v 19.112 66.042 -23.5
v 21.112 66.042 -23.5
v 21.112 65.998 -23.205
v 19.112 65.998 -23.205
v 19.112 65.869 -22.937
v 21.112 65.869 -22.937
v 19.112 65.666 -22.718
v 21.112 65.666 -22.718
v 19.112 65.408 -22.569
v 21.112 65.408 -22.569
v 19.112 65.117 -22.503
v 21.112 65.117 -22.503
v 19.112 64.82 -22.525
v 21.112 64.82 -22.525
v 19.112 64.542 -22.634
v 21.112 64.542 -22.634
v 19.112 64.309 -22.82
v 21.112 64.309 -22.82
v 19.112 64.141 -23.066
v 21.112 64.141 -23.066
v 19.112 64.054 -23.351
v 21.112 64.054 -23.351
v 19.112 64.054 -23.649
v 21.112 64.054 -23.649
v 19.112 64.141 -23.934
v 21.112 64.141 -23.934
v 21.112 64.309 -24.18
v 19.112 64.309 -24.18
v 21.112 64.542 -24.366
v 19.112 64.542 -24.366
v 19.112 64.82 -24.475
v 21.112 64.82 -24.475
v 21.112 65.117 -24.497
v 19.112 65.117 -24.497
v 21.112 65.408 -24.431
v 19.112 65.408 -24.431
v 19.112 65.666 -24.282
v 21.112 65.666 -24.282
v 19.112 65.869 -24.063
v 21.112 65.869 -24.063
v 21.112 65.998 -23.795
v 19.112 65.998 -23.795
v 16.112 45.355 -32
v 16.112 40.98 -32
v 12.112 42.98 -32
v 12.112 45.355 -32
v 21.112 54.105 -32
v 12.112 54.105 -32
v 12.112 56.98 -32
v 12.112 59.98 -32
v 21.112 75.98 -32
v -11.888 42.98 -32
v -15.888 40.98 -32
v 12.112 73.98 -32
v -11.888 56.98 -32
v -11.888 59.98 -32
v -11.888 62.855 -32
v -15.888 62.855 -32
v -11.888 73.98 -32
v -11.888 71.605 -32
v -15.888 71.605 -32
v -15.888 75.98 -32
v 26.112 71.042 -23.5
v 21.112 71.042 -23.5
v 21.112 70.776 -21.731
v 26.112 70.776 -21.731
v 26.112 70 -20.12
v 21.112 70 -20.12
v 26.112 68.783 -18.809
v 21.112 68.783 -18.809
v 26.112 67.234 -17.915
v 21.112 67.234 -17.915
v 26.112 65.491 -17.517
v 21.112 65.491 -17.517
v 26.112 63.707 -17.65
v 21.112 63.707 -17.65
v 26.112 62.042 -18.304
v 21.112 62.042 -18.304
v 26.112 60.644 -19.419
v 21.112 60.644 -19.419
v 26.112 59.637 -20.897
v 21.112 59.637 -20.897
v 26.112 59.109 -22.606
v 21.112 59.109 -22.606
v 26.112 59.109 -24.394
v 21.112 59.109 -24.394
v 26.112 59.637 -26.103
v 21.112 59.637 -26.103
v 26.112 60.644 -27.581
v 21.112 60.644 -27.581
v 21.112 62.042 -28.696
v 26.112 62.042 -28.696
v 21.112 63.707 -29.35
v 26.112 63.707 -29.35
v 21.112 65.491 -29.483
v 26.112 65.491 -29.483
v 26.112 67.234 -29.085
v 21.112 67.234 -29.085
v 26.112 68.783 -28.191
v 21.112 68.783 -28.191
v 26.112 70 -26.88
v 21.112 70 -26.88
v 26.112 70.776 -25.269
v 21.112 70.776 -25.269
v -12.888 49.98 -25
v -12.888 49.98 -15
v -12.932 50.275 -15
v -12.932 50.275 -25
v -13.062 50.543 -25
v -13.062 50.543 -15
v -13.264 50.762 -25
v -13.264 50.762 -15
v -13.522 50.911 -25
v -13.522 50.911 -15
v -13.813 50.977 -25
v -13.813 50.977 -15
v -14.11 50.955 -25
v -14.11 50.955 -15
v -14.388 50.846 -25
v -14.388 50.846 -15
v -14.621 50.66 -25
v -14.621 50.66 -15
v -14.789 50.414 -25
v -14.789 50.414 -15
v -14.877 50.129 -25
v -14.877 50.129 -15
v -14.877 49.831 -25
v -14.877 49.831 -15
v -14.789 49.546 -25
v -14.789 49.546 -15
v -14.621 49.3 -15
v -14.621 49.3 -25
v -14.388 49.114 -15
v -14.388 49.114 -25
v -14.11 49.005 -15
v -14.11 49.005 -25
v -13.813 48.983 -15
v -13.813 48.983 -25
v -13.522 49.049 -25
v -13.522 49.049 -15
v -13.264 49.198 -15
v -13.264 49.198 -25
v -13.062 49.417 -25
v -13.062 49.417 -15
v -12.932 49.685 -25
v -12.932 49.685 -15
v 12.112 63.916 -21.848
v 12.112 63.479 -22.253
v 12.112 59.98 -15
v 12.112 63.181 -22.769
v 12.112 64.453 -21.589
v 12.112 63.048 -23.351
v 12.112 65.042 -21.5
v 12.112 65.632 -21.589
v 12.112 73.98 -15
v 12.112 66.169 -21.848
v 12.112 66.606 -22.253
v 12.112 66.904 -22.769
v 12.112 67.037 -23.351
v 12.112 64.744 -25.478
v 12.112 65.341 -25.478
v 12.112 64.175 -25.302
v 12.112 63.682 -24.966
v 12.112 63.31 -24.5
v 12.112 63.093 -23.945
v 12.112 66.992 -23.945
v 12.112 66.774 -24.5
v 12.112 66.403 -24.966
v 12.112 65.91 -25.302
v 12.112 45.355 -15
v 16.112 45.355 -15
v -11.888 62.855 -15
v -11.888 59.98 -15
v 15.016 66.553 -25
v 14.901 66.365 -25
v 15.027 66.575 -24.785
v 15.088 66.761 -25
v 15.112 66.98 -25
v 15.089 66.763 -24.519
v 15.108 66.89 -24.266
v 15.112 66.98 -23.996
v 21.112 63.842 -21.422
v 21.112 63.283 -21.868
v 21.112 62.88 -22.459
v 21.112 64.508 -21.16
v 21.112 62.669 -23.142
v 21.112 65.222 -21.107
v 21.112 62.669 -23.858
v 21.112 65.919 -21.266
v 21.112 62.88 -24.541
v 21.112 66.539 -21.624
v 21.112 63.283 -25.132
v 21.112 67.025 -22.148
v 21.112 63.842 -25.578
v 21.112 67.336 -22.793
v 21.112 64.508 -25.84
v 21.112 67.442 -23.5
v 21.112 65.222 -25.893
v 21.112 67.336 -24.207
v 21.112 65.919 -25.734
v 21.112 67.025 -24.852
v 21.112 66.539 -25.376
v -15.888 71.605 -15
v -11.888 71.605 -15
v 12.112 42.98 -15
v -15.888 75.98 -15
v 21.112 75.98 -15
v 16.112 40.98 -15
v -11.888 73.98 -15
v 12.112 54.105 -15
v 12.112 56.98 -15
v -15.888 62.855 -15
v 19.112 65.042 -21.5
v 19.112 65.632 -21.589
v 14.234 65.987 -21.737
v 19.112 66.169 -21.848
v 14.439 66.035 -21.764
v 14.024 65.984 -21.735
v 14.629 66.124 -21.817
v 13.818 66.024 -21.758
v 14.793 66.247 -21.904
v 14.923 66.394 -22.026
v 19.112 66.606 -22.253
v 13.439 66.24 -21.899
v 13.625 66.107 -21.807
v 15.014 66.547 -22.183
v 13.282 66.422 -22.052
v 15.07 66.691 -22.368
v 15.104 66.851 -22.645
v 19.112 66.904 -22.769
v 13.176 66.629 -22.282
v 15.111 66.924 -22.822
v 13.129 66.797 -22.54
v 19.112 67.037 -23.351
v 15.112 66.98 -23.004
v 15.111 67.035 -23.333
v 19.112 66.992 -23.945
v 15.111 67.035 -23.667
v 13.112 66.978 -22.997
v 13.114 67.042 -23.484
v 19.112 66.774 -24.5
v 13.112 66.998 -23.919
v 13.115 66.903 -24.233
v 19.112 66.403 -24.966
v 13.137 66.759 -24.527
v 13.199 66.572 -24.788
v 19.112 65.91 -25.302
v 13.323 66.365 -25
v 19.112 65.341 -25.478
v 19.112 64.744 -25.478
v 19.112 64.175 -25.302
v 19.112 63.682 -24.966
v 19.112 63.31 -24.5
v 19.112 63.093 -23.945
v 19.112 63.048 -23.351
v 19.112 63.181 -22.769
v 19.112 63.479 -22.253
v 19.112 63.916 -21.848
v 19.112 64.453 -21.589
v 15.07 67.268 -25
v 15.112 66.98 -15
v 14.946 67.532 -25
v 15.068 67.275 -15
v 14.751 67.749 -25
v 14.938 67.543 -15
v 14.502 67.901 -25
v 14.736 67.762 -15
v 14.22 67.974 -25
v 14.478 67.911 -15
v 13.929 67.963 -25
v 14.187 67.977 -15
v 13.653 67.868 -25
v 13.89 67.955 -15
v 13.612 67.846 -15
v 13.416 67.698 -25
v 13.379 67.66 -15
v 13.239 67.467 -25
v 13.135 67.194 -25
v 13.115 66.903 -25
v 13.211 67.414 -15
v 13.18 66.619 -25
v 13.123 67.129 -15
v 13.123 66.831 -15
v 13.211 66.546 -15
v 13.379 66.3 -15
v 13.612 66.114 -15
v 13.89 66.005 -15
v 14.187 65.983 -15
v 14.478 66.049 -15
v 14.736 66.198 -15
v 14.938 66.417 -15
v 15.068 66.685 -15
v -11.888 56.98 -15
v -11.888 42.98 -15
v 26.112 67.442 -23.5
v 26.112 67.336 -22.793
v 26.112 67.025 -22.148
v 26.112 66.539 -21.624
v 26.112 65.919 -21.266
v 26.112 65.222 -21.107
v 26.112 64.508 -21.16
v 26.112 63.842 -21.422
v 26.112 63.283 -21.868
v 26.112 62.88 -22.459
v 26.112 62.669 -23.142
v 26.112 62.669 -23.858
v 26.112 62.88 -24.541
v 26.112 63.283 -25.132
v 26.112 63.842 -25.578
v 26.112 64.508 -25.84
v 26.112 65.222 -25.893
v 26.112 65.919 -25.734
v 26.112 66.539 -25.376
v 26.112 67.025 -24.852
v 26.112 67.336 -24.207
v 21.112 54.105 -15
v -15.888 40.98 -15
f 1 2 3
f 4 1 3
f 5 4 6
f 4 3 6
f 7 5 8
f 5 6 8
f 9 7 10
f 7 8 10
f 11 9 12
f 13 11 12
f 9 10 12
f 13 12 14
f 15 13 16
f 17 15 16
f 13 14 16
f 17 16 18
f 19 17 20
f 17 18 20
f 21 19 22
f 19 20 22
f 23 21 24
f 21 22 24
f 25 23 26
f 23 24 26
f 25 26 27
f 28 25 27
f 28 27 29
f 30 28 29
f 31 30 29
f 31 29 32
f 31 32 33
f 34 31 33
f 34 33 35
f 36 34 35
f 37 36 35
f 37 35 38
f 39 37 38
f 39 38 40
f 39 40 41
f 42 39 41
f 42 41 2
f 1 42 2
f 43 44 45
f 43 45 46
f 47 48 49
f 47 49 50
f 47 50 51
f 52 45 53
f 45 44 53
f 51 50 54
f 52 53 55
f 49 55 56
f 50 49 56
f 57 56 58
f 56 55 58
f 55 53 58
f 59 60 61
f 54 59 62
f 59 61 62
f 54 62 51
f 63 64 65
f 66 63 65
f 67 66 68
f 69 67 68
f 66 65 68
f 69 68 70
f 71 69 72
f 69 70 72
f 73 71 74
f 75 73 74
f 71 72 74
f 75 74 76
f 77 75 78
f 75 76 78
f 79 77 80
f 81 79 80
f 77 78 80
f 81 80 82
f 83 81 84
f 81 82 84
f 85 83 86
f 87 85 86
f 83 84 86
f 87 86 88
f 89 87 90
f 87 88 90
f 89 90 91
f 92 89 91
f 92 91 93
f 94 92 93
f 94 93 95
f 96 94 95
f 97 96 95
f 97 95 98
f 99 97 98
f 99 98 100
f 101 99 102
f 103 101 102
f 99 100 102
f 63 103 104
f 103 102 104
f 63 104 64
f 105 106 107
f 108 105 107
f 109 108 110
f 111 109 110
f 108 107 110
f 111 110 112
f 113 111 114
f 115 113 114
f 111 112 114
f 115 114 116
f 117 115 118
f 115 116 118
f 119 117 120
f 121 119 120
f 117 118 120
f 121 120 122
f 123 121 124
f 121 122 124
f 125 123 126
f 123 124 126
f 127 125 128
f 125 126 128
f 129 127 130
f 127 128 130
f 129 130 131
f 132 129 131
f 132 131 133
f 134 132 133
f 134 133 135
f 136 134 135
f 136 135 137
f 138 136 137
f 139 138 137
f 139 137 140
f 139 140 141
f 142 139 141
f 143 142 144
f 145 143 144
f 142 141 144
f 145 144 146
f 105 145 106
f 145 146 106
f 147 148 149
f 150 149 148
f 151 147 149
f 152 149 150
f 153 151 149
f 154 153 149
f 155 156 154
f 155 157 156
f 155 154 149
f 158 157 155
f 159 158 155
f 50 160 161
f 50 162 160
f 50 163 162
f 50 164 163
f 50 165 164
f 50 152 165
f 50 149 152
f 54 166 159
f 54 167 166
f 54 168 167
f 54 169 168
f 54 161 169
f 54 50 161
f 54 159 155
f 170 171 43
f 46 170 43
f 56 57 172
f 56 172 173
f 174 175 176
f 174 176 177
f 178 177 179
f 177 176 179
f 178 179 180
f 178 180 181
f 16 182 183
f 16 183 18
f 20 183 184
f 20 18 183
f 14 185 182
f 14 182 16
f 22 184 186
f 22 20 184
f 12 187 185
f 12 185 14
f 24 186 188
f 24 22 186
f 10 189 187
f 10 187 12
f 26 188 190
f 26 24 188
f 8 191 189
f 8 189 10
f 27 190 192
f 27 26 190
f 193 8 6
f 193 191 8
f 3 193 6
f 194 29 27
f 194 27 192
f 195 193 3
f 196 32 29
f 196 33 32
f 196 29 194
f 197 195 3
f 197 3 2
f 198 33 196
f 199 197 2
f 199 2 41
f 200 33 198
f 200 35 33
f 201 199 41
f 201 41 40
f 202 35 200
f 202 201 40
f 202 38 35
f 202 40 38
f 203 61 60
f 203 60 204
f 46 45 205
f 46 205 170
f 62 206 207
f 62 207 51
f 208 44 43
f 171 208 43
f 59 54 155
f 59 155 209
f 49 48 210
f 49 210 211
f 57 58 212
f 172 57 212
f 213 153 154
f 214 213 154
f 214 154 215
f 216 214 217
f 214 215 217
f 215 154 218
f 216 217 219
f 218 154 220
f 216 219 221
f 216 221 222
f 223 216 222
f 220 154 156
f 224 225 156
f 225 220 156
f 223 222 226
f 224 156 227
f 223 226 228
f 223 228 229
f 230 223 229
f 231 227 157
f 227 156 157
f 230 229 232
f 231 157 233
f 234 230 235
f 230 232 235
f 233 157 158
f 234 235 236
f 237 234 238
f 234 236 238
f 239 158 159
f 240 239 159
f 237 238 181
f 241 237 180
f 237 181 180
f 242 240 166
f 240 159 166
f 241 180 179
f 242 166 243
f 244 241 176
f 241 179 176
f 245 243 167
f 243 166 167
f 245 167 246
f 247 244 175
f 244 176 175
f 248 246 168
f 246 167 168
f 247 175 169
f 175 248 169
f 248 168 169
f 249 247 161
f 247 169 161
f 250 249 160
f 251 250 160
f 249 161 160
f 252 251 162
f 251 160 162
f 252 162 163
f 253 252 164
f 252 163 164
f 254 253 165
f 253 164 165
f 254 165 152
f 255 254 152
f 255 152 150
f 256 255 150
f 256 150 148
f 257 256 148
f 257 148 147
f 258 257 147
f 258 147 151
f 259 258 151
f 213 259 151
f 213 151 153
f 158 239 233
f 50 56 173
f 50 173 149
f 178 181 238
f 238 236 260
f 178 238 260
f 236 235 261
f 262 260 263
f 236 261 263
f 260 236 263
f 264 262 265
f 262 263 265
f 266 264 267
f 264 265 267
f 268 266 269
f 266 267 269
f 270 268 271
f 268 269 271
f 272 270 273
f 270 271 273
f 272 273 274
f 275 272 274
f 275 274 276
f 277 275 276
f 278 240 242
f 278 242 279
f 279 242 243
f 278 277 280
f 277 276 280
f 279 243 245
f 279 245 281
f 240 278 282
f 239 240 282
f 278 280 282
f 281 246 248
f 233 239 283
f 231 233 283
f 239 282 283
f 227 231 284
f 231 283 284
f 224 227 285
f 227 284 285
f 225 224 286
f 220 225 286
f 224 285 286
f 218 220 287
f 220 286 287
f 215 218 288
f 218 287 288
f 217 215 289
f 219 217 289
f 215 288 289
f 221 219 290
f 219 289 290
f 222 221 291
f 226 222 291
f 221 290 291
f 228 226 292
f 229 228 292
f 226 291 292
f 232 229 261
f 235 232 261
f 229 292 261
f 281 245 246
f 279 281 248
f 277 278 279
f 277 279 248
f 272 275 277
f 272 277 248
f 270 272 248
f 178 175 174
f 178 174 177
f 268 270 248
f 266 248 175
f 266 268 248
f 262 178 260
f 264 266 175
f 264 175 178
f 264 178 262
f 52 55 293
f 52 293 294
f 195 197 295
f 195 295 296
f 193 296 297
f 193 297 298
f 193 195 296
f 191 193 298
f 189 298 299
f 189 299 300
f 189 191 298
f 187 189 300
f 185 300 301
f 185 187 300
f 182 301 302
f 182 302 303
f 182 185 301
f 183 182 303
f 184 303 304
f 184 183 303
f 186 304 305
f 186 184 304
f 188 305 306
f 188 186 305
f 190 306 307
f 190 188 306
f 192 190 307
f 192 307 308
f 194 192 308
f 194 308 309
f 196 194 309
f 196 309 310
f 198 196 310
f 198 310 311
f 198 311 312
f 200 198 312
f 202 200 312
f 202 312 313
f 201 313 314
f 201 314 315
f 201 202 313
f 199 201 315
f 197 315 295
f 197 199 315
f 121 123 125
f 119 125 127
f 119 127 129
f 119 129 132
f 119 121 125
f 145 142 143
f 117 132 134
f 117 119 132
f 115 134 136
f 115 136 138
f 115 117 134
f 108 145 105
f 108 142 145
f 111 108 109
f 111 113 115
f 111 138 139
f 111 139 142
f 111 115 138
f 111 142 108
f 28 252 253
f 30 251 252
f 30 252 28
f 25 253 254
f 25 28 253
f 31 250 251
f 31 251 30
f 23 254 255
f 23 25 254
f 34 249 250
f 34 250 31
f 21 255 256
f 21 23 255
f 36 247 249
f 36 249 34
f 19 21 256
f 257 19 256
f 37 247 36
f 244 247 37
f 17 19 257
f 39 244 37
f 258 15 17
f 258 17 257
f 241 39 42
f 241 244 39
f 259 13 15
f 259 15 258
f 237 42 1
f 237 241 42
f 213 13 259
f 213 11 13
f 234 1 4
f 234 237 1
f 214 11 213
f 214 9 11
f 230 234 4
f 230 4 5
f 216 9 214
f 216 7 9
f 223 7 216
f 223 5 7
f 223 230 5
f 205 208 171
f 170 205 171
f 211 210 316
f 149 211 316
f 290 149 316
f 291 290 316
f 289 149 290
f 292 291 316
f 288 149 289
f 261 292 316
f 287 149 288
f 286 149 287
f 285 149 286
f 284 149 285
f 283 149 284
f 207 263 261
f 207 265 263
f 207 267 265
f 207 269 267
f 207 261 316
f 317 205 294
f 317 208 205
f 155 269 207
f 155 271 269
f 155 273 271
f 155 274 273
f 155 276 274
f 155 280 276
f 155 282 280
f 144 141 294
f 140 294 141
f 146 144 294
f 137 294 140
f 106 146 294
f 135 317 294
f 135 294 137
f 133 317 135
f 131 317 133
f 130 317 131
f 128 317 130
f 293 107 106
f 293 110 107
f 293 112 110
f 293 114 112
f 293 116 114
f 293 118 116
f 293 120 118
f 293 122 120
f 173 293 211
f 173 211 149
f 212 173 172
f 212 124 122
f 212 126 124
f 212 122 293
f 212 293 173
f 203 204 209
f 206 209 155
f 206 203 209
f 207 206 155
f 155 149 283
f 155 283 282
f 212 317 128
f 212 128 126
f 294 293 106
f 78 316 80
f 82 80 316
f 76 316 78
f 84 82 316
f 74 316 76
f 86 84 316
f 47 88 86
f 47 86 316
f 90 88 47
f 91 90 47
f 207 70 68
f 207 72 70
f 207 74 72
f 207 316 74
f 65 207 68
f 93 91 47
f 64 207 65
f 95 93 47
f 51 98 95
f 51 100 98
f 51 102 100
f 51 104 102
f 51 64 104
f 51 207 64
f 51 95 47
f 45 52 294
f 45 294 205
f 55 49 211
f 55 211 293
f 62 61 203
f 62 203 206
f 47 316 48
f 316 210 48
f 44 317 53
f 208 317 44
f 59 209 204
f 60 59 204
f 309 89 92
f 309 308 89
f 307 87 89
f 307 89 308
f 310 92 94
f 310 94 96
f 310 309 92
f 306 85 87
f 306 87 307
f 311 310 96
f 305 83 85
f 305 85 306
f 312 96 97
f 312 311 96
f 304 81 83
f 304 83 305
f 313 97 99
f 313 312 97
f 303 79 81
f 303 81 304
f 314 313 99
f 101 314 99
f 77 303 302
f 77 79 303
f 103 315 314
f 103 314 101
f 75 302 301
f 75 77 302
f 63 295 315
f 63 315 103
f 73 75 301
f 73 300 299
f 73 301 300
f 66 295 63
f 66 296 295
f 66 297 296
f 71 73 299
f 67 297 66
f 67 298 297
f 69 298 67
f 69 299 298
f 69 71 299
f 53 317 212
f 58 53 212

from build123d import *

# Parameters (mm, degrees)
SKETCH2_W               = 32.000000477
SKETCH2_H               = 35
SKETCH2_W_2             = 22
SKETCH2_H_2             = 5
BOSS_EXTRUDE1_DEPTH     = 35
SKETCH3_W               = 15
SKETCH3_H               = 35
CUT_EXTRUDE1_DEPTH      = 90.56534365
CUT_EXTRUDE2_REACH      = 91.565
SKETCH4_W               = 20
SKETCH4_H               = 8.75
CUT_EXTRUDE3_REACH      = 91.565
SKETCH5_W               = 20
SKETCH5_H               = 8.75
SKETCH6_W               = 3
SKETCH6_H               = 35
CUT_EXTRUDE4_DEPTH      = 90.56534365
SKETCH11_R              = 1
CUT_EXTRUDE5_DEPTH      = 10
CUT_EXTRUDE6_DEPTH      = 80.508206961
CUT_EXTRUDE6_DEPTH_BACK = 17
CUT_EXTRUDE9_START      = -17
CUT_EXTRUDE9_DEPTH      = 17
SKETCH7_W               = 17
SKETCH7_H               = 21.875
BOSS_EXTRUDE2_DEPTH     = 5
SKETCH14_R              = 6
SKETCH14_R_2            = 2.4
BOSS_EXTRUDE6_DEPTH     = 5
CUT_EXTRUDE10_REACH     = 92.366
SKETCH15_R              = 1
SKETCH16_R              = 2
CUT_EXTRUDE11_DEPTH     = 7.000000238


# Read off the part's stored shape, not the designer's step: Cut-Extrude9
with BuildPart() as part:
    # Sketch2 → Boss-Extrude1 (new body)
    # profile 1 of 2: a face of its own
    with BuildSketch(Plane.XY):
        with Locations((0.112238017, 58.479936513)):
            Rectangle(SKETCH2_W, SKETCH2_H)
        Polygon((-10.887761984, 72.979936603), (-10.887761984, 43.979936513), (11.112238016, 43.979936513), (11.112238016, 72.979936513), align=None, mode=Mode.SUBTRACT)
    # profile 2 of 2: a face of its own
    with BuildSketch(Plane.XY):
        with Locations((0.112238016, 58.479936513)):
            Rectangle(SKETCH2_W_2, SKETCH2_H_2)
    extrude(amount=-BOSS_EXTRUDE1_DEPTH)

    # Sketch3 → Cut-Extrude1 (cut, through all)
    with BuildSketch(Plane(origin=(16.112238255, 0, 0), x_dir=(0, 0, -1), z_dir=(1, 0, 0))):
        with Locations((7.5, 58.479936513)):
            Rectangle(SKETCH3_W, SKETCH3_H)
    extrude(amount=-CUT_EXTRUDE1_DEPTH, mode=Mode.SUBTRACT)

    # Sketch4 → Cut-Extrude2 (cut, up to next)
    with BuildSketch(Plane.ZY.offset(15.887762222), mode=Mode.PRIVATE) as cut_extrude2_sk1:
        with Locations((-25, 67.229936513)):
            Rectangle(SKETCH4_W, SKETCH4_H)
    cut_extrude2_tool1 = extrude(cut_extrude2_sk1.sketch, amount=-CUT_EXTRUDE2_REACH, mode=Mode.PRIVATE) & part.part
    add(cut_extrude2_tool1.solids().sort_by_distance((-15.887762, 67.229937, -25))[0], mode=Mode.SUBTRACT)

    # Sketch5 → Cut-Extrude3 (cut, up to next)
    with BuildSketch(Plane(origin=(16.112238255, 0, 0), x_dir=(0, 0, -1), z_dir=(1, 0, 0)), mode=Mode.PRIVATE) as cut_extrude3_sk1:
        with Locations((25, 49.729936513)):
            Rectangle(SKETCH5_W, SKETCH5_H)
    cut_extrude3_tool1 = extrude(cut_extrude3_sk1.sketch, amount=-CUT_EXTRUDE3_REACH, mode=Mode.PRIVATE) & part.part
    add(cut_extrude3_tool1.solids().sort_by_distance((16.112238, 49.729937, -25))[0], mode=Mode.SUBTRACT)

    # Sketch6 → Cut-Extrude4 (cut, through all)
    with BuildSketch(Plane.ZY.offset(15.887762222)):
        with Locations((-33.5, 58.479936513)):
            Rectangle(SKETCH6_W, SKETCH6_H)
    extrude(amount=-CUT_EXTRUDE4_DEPTH, mode=Mode.SUBTRACT)

    # Sketch11 → Cut-Extrude5 (cut)
    with BuildSketch(Plane.XY.offset(-15)):
        with Locations((14.112238016, 66.979936513)):
            Circle(SKETCH11_R)
        with Locations((-13.887761984, 49.979936513)):
            Circle(SKETCH11_R)
    extrude(amount=-CUT_EXTRUDE5_DEPTH, mode=Mode.SUBTRACT)

    # Sketch12 → Cut-Extrude6 (cut, two sides: drawn at the far end of the back side and taken through both)
    with BuildSketch(Plane.XY.offset(-15).offset(-CUT_EXTRUDE6_DEPTH_BACK)):
        Polygon((-10.887761984, 62.854936513), (-11.887761984, 62.854936513), (-11.887761984, 59.979936513), (12.112238016, 59.979936513), (12.112238016, 73.979936509), (-11.887761984, 73.979936607), (-11.887761984, 71.604936513), (-10.887761984, 71.604936513), (-10.887761984, 72.979936603), (11.112238016, 72.979936513), (11.112238016, 60.979936513), (-10.887761984, 60.979936513), align=None)
    extrude(amount=CUT_EXTRUDE6_DEPTH + CUT_EXTRUDE6_DEPTH_BACK, mode=Mode.SUBTRACT)

    # Cut-Extrude9 outline → Cut-Extrude9 (cut)
    with BuildSketch(Plane.XY.offset(-15).offset(CUT_EXTRUDE9_START)):
        Polygon((12.112238016, 56.979936513), (-11.887761984, 56.979936513), (-11.887761984, 42.979936513), (12.112238016, 42.979936513), (12.112238016, 45.354936513), (11.112238016, 45.354936513), (11.112238016, 43.979936513), (-10.887761984, 43.979936513), (-10.887761984, 55.979936513), (11.112238016, 55.979936513), (11.112238016, 54.104936513), (12.112238016, 54.104936513), align=None)
    extrude(amount=CUT_EXTRUDE9_DEPTH, mode=Mode.SUBTRACT)

    # Sketch7 → Boss-Extrude2 (add)
    with BuildSketch(Plane(origin=(16.112238255, 0, 0), x_dir=(0, 0, -1), z_dir=(1, 0, 0))):
        with Locations((23.5, 65.042436513)):
            Rectangle(SKETCH7_W, SKETCH7_H)
    extrude(amount=BOSS_EXTRUDE2_DEPTH)

    # Sketch14 → Boss-Extrude6 (add)
    with BuildSketch(Plane(origin=(21.112238255, 0, 0), x_dir=(0, 0, -1), z_dir=(1, 0, 0))):
        with Locations(Location((23.5, 65.042436513, 0), (0, 0, 90))):
            Circle(SKETCH14_R)
        with Locations(Location((23.5, 65.042436513, 0), (0, 0, 90))):
            Circle(SKETCH14_R_2, mode=Mode.SUBTRACT)
    extrude(amount=BOSS_EXTRUDE6_DEPTH)

    # Sketch15 → Cut-Extrude10 (cut, up to next)
    with BuildSketch(Plane(origin=(21.112238255, 0, 0), x_dir=(0, 0, -1), z_dir=(1, 0, 0)), mode=Mode.PRIVATE) as cut_extrude10_sk1:
        with Locations(Location((23.5, 65.042436513, 0), (0, 0, 90))):
            Circle(SKETCH15_R)
    cut_extrude10_tool1 = extrude(cut_extrude10_sk1.sketch, amount=-CUT_EXTRUDE10_REACH, mode=Mode.PRIVATE) & part.part
    add(cut_extrude10_tool1.solids().sort_by_distance((21.112238, 65.042437, -23.5))[0], mode=Mode.SUBTRACT)

    # Sketch16 → Cut-Extrude11 (cut)
    with BuildSketch(Plane.ZY.offset(-12.112238016)):
        with Locations((-23.5, 65.042436513)):
            Circle(SKETCH16_R)
    extrude(amount=-CUT_EXTRUDE11_DEPTH, mode=Mode.SUBTRACT)


solid = part.part
